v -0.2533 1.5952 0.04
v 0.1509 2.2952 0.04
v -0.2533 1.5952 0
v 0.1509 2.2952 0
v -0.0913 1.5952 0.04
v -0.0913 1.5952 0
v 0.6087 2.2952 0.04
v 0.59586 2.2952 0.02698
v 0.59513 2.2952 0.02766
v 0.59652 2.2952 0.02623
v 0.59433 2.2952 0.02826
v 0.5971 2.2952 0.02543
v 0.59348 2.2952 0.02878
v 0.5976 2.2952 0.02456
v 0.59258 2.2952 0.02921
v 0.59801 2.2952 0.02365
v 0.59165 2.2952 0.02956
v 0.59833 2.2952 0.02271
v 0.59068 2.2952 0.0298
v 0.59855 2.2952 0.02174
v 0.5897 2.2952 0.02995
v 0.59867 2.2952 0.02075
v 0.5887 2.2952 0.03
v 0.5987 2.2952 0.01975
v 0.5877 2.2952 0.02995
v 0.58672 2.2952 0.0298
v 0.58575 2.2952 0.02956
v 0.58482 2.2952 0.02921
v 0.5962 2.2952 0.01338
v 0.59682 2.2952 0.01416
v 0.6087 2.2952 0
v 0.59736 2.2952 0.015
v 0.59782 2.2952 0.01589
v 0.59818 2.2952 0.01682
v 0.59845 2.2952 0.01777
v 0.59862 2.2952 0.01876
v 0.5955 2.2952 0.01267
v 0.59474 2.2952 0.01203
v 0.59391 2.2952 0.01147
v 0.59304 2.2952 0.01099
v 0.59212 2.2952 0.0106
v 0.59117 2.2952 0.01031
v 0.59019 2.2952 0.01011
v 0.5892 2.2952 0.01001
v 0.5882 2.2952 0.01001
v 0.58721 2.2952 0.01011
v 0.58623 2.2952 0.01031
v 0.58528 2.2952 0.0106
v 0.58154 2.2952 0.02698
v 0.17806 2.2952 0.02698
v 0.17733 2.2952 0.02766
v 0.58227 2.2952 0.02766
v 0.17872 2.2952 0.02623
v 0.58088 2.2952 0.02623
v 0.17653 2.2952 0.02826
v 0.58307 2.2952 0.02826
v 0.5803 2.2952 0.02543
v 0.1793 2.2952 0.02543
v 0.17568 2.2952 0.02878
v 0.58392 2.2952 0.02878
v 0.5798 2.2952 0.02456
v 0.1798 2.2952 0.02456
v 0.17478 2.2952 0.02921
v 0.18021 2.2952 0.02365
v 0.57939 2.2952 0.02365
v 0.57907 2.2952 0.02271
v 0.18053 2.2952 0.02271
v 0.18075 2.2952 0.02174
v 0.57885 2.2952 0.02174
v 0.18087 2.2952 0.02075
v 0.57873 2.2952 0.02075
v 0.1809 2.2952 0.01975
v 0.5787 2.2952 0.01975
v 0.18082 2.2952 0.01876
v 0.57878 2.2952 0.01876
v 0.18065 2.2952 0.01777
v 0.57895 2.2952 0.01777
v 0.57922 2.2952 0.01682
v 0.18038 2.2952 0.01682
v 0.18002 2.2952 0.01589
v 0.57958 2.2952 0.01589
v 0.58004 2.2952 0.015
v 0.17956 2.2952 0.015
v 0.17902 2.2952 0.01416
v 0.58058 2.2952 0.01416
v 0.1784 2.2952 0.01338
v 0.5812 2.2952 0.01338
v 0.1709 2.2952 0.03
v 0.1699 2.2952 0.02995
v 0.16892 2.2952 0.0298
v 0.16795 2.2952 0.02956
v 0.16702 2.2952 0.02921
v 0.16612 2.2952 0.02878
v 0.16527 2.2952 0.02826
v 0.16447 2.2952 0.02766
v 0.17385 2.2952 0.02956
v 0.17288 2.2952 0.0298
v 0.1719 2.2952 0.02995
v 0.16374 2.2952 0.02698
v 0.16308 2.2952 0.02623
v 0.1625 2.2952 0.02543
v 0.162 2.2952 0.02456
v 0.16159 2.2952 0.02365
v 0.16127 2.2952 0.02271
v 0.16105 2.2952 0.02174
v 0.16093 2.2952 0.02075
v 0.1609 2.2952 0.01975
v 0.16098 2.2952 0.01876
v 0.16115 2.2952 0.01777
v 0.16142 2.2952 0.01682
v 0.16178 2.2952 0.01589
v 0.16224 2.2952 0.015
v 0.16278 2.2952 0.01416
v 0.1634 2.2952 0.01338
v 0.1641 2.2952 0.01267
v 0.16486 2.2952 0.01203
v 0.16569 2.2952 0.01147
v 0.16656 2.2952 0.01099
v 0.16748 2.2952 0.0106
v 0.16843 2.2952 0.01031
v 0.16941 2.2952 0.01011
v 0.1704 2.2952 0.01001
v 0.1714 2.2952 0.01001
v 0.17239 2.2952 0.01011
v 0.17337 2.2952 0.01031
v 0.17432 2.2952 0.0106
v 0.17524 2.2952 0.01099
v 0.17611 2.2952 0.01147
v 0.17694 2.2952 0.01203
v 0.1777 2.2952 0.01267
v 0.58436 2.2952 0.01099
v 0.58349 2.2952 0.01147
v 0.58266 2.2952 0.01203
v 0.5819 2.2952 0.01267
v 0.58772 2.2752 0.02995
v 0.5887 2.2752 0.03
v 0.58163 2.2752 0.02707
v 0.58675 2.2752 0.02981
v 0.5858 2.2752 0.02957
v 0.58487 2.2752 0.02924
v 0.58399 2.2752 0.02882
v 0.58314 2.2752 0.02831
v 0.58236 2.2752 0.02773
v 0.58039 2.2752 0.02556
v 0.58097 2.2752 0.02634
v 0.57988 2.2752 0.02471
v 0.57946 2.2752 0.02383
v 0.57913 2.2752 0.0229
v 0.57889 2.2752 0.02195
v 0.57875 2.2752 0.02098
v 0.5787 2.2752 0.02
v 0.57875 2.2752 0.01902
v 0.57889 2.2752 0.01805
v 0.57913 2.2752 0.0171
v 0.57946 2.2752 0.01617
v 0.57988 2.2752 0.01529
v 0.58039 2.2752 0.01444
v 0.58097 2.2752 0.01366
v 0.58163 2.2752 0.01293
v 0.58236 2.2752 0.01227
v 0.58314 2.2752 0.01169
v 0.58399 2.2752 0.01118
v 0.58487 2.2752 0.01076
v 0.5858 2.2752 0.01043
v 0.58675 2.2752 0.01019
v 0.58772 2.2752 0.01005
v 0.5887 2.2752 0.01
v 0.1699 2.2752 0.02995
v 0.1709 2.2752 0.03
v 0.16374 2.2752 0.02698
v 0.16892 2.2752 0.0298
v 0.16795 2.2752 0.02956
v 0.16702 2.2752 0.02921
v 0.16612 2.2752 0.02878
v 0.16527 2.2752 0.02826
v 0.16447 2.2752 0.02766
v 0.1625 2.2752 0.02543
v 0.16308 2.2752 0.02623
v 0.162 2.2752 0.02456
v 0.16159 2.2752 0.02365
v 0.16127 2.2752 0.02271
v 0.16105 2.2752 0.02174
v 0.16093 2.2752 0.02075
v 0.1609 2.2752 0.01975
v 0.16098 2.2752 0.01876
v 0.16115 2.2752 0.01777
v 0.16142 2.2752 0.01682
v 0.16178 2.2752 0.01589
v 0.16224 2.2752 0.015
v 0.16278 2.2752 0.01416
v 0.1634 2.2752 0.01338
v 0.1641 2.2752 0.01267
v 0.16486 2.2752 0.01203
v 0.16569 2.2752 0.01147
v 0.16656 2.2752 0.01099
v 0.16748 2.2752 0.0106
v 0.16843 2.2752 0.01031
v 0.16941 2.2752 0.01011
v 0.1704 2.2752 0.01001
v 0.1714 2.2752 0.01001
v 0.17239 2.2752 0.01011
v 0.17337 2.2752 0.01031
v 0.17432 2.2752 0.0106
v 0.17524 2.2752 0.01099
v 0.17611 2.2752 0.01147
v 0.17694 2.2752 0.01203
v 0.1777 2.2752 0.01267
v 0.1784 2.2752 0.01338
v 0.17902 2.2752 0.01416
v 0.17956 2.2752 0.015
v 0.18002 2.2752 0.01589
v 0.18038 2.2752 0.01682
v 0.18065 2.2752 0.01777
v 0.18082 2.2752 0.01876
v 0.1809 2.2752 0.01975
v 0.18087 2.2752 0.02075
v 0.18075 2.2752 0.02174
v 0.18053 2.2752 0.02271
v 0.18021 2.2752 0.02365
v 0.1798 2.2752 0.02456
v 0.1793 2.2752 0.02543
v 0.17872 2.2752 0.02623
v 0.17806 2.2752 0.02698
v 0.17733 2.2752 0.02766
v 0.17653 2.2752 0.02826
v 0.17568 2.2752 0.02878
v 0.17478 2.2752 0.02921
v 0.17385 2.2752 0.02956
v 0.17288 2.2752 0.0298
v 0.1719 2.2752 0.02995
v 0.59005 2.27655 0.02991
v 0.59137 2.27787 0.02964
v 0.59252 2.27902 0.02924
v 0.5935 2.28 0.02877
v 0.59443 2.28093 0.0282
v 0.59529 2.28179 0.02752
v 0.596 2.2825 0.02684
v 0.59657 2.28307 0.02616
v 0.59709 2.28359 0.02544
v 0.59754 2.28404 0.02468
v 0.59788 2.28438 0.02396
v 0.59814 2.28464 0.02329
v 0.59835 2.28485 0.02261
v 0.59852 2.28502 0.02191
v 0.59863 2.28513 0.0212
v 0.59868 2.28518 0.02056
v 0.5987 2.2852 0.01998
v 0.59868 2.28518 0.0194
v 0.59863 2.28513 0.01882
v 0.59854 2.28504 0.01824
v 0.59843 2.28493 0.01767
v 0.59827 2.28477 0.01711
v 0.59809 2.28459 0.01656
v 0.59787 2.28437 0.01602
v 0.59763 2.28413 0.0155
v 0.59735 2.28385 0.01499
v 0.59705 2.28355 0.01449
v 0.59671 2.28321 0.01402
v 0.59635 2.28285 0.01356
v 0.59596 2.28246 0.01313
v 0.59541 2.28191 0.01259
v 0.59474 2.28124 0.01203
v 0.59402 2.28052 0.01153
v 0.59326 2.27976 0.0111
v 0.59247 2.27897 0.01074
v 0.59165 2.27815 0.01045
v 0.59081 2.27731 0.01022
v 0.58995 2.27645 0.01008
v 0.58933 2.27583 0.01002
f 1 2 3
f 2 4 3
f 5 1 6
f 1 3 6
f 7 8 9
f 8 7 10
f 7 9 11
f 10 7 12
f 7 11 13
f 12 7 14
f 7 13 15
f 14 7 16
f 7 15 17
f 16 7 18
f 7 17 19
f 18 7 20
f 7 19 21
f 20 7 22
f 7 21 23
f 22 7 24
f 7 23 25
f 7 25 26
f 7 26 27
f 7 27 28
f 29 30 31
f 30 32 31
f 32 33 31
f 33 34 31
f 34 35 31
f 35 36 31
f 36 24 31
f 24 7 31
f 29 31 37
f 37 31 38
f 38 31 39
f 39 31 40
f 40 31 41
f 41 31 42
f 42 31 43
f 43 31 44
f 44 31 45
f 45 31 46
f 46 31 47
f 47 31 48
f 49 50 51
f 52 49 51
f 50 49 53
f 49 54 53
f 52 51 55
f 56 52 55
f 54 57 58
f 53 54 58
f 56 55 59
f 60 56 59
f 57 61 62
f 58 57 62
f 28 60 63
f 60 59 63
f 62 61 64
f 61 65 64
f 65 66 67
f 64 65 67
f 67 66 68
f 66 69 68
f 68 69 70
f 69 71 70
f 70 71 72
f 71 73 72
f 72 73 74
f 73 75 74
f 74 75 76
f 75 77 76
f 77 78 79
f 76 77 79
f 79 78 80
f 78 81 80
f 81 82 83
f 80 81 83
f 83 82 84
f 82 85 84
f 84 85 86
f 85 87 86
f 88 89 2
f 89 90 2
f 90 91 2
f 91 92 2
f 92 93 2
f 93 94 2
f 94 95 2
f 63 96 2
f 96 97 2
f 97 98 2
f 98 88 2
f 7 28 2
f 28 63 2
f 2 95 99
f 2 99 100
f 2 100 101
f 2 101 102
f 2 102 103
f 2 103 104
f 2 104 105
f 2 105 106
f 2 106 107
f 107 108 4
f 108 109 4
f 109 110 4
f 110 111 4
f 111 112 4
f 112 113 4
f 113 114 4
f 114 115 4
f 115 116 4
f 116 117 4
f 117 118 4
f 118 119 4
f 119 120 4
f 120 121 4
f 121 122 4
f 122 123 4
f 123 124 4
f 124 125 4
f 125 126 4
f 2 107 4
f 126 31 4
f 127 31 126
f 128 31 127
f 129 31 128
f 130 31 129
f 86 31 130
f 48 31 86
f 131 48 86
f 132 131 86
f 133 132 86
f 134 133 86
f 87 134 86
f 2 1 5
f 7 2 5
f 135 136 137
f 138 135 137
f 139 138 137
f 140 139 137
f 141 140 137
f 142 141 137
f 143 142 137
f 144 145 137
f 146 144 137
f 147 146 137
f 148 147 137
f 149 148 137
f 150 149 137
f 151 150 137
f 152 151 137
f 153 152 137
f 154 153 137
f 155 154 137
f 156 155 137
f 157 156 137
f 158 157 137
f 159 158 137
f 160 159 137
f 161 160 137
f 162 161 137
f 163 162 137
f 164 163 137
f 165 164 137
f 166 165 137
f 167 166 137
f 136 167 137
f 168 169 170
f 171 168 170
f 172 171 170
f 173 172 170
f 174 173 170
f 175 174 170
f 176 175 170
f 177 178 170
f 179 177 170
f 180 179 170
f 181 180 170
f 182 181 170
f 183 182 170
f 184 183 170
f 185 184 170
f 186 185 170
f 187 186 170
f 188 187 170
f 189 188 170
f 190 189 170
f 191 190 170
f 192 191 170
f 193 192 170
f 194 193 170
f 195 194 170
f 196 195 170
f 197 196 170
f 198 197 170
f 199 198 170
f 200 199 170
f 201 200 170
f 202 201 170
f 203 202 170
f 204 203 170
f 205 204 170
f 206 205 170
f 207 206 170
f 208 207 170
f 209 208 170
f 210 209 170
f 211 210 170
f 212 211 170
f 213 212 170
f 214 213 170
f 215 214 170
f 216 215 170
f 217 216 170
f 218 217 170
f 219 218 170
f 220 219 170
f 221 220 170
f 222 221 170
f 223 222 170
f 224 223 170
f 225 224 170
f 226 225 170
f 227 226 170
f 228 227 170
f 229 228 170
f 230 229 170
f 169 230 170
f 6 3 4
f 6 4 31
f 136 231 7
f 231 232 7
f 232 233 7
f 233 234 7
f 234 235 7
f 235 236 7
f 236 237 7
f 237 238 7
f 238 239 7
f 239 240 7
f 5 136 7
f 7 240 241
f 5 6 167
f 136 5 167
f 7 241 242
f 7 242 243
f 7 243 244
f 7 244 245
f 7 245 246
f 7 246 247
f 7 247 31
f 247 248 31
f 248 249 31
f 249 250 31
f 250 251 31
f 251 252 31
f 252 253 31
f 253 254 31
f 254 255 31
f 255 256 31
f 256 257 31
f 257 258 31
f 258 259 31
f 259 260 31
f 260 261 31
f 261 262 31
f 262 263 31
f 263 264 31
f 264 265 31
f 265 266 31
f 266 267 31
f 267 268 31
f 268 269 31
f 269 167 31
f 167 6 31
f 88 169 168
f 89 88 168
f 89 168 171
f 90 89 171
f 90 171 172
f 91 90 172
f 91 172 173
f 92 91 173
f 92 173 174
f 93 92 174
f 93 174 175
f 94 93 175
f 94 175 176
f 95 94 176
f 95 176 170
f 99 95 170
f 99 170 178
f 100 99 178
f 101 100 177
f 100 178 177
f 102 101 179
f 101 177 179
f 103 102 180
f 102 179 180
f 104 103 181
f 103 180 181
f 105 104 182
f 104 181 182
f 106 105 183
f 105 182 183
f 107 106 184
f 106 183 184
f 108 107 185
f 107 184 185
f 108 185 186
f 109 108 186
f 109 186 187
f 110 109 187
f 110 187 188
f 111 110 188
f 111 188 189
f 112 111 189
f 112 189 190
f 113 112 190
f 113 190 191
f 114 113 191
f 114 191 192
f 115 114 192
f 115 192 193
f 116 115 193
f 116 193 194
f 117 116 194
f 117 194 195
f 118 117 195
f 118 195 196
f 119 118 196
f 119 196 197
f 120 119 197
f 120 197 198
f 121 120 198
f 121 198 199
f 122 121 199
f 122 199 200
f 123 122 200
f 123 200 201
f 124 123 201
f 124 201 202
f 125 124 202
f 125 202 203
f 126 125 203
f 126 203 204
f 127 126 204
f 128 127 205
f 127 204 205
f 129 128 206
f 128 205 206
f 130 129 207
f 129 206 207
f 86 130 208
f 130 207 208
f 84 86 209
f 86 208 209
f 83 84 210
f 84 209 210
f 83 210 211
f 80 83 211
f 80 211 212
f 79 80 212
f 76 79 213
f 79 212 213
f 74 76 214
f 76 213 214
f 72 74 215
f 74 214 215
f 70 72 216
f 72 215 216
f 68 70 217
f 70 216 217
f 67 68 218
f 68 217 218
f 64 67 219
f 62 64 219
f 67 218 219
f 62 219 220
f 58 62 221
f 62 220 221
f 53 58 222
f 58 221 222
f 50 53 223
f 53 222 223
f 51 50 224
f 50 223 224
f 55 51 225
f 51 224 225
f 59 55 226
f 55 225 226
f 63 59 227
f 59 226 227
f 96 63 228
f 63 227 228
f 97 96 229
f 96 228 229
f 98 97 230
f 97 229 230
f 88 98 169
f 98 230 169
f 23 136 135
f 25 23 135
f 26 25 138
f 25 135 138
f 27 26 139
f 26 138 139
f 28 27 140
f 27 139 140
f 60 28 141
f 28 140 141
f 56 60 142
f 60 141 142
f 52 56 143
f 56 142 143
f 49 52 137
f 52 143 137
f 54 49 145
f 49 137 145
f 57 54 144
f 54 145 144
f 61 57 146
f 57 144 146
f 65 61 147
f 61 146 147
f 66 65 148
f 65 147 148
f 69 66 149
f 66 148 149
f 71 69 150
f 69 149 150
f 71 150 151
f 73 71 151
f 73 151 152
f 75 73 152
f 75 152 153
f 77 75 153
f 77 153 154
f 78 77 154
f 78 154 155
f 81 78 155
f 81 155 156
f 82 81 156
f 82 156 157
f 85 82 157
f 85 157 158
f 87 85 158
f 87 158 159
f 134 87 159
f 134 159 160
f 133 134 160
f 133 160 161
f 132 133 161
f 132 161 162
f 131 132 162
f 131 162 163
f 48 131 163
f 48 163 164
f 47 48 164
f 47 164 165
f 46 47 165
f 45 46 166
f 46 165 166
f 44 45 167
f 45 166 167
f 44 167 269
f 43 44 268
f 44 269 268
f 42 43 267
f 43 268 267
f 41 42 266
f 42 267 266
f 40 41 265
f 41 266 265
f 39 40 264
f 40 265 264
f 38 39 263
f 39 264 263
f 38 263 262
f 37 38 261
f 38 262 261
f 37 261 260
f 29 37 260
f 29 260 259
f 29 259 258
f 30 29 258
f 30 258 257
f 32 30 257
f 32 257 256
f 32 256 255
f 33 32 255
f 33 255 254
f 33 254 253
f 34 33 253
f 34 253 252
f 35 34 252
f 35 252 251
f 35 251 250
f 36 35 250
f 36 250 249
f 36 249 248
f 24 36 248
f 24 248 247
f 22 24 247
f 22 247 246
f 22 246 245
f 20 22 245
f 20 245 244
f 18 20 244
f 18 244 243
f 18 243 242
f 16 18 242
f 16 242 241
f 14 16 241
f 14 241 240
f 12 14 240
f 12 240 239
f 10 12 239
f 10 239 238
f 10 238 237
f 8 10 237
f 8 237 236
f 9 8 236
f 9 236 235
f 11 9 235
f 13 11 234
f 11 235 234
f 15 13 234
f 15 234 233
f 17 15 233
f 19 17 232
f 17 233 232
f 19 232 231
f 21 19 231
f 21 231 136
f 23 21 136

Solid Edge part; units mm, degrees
sketch "Sketch1" plane through (0, 0, 0) normal (0, 0, 1) x (1, 0, 0)
  line L0 (-0.0913, 1.5952) -> (0.6087, 2.2952)
  line L1 (0.6087, 2.2952) -> (0.1509, 2.2952)
  line L2 (0.1509, 2.2952) -> (-0.2533, 1.5952)
  line L3 (-0.2533, 1.5952) -> (-0.0913, 1.5952)
extrude "Protrusion1" add sketch "Sketch1" along normal blind 0.04
hole "Bohrung_11" at (0.5887, 2.2952, 0.02) direction (0, -1, 0) diameter 0.02 depth 0.02
hole "Hole1" at (0.1709, 2.2952, 0.02) direction (0, -1, 0) diameter 0.02 depth 0.02
